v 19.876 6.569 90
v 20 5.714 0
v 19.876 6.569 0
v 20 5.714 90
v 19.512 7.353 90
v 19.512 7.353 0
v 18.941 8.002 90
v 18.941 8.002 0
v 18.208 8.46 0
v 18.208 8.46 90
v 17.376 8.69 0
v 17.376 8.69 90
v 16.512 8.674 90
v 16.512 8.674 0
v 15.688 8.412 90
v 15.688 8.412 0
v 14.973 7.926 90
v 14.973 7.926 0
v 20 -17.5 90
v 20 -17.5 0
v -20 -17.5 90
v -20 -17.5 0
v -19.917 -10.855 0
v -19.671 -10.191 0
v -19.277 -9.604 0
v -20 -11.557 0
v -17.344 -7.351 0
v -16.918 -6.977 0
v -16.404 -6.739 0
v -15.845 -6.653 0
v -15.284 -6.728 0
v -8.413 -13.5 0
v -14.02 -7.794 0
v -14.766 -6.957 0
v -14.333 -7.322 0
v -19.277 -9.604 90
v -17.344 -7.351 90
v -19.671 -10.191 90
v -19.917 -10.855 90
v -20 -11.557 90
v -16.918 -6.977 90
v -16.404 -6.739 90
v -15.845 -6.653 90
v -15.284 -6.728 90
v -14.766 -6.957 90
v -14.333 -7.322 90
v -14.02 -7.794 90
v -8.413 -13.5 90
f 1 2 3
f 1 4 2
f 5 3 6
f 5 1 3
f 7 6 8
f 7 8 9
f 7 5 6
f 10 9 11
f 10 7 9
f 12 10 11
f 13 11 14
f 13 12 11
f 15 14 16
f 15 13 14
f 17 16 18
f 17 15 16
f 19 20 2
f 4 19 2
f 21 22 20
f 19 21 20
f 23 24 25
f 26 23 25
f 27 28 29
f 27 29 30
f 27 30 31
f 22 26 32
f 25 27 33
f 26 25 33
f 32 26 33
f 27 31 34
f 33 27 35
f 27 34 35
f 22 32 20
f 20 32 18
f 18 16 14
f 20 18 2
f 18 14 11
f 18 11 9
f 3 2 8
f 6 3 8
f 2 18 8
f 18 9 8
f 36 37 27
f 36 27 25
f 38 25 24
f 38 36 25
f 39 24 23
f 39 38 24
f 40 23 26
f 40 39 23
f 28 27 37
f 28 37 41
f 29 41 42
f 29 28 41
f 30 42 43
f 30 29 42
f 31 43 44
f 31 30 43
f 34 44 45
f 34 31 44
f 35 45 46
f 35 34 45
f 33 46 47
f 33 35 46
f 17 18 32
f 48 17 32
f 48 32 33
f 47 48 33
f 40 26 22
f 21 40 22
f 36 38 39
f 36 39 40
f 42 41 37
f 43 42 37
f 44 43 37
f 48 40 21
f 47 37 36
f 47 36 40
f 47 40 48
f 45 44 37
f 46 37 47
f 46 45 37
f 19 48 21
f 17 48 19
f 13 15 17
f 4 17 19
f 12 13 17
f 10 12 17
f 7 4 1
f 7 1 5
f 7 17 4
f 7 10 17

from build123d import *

# Parameters (mm, degrees)
F1_DEPTH    = 90
F2_R        = 3
F3_T1_DEPTH = 113.3705433716


# Not quite as in the source:
# - a fillet or chamfer that OpenCascade refuses, or shapes differently, is made with other operations: its cross-section is extruded or revolved along the edge and cut away or added


with BuildPart() as f1:
    # F0 (on Top) → F1 (new body)
    with BuildSketch(Plane.XY):
        Polygon((-20, -17.5), (20, -17.5), (20, 12.5313148581), (-8.4129939735, -13.5), (-14.0197880107, -7.7935246759), (-14.2998851884, -3.8033435308), (-20, -10.4466760531), align=None)
    extrude(amount=F1_DEPTH)

    # F2
    f2_edges = [f1.edges().sort_by_distance(p)[0] for p in [
        (-20, -10.446676, 45),
        (20, 12.531315, 45),
    ]]
    fillet(f2_edges, radius=F2_R)

    # F3: fillet of radius 2 on 1 edges, made by hand

    # F3_s2 → F3_t1 (cut)
    with BuildSketch(Plane.XY.offset(-11.6852716858)):
        with BuildLine():
            ThreePointArc((-17.3435489028, -7.3506528059), (-15.5615402204, -6.6705242909), (-14.0197880107, -7.7935246759))
            Line((-14.0197880107, -7.7935246759), (-14.2998851884, -3.8033435308))
            Line((-14.2998851884, -3.8033435308), (-17.3435489028, -7.3506528059))
        make_face()
    extrude(amount=F3_T1_DEPTH, mode=Mode.SUBTRACT)


solid = f1.part
